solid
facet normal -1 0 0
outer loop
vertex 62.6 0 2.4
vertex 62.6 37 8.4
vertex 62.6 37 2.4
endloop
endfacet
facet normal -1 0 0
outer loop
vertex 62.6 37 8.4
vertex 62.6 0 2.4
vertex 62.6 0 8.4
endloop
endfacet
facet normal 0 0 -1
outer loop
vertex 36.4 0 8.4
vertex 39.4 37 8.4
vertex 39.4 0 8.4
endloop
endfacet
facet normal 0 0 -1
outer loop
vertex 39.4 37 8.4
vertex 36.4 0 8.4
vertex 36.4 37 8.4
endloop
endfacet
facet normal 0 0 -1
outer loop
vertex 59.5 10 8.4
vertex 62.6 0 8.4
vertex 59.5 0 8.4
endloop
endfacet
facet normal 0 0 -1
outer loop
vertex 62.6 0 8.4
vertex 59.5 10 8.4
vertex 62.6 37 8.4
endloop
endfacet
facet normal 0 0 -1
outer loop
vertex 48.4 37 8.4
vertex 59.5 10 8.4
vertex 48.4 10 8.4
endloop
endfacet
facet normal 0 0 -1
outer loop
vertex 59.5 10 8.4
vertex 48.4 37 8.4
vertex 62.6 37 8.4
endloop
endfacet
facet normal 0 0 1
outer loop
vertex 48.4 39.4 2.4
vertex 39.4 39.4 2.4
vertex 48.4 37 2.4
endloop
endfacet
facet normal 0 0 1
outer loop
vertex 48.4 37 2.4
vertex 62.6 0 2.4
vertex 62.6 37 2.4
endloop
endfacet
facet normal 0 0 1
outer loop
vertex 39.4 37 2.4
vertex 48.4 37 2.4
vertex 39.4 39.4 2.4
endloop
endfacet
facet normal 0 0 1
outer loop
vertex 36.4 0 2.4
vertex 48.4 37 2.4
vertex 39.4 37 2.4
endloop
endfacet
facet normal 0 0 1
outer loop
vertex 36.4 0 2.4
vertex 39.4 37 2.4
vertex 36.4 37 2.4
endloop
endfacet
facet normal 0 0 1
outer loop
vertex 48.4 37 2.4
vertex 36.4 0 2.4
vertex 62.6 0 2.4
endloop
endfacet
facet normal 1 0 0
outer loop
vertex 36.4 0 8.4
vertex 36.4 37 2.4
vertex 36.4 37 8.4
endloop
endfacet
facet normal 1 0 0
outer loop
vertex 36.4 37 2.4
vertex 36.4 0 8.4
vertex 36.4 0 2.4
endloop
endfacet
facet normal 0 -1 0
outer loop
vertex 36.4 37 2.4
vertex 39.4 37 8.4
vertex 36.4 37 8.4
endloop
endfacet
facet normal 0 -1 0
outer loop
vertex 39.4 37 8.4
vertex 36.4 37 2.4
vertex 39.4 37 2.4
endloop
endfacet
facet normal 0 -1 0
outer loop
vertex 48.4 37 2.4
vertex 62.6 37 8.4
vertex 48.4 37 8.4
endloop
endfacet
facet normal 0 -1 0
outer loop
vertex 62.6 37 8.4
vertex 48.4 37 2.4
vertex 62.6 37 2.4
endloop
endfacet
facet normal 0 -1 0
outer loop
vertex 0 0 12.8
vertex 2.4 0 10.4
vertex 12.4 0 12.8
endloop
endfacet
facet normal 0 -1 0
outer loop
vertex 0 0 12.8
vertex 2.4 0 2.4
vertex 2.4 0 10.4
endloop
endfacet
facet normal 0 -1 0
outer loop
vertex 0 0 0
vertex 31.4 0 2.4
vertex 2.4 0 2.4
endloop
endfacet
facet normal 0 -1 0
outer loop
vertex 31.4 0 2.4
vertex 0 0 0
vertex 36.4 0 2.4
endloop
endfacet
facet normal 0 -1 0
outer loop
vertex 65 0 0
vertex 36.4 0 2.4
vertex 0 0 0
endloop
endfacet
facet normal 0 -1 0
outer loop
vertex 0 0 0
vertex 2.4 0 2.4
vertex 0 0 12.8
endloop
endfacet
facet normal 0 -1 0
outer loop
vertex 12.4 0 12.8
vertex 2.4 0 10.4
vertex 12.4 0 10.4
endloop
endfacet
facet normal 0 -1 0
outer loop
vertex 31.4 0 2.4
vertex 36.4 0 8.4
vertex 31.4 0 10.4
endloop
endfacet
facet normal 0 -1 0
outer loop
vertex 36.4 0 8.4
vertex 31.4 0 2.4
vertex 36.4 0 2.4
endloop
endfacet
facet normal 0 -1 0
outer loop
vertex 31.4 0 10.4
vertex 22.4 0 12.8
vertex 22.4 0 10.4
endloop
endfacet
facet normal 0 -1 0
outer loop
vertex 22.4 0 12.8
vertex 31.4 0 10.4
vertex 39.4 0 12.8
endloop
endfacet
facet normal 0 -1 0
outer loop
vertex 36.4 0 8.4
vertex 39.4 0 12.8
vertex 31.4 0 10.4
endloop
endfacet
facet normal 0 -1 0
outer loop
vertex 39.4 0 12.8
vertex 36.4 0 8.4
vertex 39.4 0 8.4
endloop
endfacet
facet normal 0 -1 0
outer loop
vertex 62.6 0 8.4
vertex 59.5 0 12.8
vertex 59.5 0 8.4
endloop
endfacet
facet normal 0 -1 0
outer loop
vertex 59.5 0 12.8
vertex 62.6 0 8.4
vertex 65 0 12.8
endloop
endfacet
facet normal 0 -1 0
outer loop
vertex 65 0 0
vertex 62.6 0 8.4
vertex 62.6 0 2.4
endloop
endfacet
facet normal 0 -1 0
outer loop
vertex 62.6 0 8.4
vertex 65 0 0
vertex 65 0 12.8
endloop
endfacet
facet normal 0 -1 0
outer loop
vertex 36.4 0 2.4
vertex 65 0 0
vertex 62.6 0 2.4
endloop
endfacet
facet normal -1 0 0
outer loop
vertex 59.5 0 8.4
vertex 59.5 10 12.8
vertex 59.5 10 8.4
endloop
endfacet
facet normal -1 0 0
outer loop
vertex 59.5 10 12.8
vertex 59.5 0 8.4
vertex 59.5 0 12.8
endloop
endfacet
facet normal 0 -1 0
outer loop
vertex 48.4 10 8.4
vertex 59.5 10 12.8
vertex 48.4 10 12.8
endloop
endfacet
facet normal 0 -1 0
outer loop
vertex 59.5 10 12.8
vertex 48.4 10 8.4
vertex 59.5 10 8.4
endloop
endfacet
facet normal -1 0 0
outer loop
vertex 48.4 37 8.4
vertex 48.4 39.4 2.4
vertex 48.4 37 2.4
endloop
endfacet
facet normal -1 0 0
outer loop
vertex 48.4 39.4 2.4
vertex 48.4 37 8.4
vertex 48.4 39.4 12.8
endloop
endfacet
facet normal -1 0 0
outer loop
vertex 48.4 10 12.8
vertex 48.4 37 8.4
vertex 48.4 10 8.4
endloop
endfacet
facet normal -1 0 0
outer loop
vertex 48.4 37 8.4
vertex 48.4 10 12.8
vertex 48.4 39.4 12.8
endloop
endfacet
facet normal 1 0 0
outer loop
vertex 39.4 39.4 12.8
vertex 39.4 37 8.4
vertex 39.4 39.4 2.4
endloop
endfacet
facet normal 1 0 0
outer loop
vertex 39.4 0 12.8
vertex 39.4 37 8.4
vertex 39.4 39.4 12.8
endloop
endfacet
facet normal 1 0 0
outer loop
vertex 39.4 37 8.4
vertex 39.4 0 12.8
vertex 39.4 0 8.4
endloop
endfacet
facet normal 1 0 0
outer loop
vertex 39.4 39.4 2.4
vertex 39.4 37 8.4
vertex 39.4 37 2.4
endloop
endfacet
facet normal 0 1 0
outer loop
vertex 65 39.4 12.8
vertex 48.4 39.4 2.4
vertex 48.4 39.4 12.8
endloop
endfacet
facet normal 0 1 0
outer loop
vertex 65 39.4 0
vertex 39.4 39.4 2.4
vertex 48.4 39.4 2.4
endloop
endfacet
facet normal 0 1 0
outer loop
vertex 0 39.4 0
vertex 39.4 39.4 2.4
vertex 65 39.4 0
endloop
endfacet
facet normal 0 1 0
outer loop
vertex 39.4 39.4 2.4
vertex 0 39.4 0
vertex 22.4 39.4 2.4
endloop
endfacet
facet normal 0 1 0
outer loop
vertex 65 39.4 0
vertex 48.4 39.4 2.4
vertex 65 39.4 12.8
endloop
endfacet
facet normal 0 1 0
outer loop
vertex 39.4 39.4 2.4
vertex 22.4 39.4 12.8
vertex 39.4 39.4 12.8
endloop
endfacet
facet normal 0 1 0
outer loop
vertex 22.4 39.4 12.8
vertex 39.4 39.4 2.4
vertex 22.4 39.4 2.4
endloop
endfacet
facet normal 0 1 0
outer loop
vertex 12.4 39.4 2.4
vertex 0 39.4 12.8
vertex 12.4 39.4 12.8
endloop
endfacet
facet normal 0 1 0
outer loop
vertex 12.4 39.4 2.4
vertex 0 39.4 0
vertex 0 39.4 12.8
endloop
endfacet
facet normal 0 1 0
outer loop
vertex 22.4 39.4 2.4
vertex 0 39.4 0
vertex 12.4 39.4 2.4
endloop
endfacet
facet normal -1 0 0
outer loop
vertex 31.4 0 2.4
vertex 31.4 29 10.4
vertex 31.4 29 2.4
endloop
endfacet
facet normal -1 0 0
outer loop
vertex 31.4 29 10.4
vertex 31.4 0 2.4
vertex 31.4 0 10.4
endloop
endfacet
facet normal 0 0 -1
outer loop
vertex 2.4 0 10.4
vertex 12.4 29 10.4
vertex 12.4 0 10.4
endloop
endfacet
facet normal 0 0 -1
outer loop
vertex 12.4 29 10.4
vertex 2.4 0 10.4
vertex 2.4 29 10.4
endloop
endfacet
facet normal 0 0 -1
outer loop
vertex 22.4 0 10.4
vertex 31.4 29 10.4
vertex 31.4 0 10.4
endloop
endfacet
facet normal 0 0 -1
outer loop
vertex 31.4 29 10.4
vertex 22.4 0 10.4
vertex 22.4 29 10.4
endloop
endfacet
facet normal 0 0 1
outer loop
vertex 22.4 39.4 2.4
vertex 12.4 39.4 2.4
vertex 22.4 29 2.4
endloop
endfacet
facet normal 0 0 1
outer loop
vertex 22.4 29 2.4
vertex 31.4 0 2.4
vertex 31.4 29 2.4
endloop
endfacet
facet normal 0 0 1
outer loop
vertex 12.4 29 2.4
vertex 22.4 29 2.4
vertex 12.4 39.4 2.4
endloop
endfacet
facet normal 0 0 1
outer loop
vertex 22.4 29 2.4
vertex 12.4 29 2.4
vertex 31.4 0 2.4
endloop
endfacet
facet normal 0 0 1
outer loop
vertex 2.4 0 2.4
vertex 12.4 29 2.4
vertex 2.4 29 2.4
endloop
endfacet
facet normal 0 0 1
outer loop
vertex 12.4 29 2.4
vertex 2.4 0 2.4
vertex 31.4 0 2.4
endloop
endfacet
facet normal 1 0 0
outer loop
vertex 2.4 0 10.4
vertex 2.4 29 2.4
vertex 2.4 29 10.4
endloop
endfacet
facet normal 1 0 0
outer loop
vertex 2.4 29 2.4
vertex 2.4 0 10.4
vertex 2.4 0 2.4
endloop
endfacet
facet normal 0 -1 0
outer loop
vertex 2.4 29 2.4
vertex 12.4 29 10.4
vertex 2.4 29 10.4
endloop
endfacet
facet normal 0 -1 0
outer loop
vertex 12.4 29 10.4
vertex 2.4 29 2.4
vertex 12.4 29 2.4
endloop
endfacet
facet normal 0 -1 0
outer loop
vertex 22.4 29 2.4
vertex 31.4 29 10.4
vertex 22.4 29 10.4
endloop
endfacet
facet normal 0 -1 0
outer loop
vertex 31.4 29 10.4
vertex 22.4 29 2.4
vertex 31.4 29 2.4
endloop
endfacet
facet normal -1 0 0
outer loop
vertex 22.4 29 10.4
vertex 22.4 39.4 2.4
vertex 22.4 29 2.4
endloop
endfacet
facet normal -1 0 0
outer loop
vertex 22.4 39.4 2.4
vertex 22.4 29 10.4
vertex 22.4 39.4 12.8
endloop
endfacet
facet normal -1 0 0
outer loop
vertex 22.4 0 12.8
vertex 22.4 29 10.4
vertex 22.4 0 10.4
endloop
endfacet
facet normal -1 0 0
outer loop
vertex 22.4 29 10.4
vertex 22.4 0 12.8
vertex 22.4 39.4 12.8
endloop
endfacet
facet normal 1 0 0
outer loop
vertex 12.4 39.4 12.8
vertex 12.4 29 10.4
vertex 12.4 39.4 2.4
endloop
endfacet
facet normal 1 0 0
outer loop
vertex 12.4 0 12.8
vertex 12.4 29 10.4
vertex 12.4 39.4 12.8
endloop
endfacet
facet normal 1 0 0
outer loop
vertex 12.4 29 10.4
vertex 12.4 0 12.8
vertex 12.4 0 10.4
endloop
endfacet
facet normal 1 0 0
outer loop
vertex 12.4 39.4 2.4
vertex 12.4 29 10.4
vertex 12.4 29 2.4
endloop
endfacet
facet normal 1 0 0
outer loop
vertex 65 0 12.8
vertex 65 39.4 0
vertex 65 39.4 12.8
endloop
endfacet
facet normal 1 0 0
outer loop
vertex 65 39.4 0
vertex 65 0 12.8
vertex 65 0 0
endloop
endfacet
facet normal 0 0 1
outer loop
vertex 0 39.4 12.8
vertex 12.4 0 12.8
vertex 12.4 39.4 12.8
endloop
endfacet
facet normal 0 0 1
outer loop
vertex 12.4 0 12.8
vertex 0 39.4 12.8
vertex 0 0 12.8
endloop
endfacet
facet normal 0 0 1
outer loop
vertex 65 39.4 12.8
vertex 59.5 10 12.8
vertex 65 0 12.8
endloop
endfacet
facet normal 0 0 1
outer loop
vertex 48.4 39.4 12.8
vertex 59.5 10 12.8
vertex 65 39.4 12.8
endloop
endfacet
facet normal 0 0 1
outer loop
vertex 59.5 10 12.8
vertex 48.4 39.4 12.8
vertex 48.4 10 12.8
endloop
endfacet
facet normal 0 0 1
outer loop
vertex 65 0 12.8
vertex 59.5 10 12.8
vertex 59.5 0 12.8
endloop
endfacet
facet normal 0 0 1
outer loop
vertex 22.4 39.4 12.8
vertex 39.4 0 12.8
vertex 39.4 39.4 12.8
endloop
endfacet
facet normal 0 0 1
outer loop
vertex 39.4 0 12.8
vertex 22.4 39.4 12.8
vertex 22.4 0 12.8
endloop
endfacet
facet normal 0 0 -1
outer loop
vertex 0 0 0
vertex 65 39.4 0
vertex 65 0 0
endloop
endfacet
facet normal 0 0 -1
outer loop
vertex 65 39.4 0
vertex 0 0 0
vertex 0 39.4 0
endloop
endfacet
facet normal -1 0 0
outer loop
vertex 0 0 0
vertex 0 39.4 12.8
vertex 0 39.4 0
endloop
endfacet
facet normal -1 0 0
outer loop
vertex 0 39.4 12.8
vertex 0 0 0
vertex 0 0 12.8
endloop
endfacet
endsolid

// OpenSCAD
min_thickness=2.4;

overall_dim=[65, 37 + min_thickness, 8 + min_thickness * 2];
antenna_dim=[29,29,8];
chip_dim=[26.2, 37, 6];
chip_pin_dim=[20, 10, overall_dim.z];

difference() {
    cube(overall_dim);
    translate([0,0,min_thickness]) {
        translate([min_thickness, 0, 0]) {
            cube(antenna_dim);
        }

        translate([min_thickness + 10,0,0]) {
            cube([10, overall_dim.y, overall_dim.z]);
        }

        translate([min_thickness + antenna_dim.x + 5, 0, 0]) {
            cube(chip_dim);
            translate([(chip_dim.x - chip_pin_dim.x)/2,0,0]) cube(chip_pin_dim);
            translate([3,0,0]) cube([9, overall_dim.y, overall_dim.z]);
        }
    }
}
